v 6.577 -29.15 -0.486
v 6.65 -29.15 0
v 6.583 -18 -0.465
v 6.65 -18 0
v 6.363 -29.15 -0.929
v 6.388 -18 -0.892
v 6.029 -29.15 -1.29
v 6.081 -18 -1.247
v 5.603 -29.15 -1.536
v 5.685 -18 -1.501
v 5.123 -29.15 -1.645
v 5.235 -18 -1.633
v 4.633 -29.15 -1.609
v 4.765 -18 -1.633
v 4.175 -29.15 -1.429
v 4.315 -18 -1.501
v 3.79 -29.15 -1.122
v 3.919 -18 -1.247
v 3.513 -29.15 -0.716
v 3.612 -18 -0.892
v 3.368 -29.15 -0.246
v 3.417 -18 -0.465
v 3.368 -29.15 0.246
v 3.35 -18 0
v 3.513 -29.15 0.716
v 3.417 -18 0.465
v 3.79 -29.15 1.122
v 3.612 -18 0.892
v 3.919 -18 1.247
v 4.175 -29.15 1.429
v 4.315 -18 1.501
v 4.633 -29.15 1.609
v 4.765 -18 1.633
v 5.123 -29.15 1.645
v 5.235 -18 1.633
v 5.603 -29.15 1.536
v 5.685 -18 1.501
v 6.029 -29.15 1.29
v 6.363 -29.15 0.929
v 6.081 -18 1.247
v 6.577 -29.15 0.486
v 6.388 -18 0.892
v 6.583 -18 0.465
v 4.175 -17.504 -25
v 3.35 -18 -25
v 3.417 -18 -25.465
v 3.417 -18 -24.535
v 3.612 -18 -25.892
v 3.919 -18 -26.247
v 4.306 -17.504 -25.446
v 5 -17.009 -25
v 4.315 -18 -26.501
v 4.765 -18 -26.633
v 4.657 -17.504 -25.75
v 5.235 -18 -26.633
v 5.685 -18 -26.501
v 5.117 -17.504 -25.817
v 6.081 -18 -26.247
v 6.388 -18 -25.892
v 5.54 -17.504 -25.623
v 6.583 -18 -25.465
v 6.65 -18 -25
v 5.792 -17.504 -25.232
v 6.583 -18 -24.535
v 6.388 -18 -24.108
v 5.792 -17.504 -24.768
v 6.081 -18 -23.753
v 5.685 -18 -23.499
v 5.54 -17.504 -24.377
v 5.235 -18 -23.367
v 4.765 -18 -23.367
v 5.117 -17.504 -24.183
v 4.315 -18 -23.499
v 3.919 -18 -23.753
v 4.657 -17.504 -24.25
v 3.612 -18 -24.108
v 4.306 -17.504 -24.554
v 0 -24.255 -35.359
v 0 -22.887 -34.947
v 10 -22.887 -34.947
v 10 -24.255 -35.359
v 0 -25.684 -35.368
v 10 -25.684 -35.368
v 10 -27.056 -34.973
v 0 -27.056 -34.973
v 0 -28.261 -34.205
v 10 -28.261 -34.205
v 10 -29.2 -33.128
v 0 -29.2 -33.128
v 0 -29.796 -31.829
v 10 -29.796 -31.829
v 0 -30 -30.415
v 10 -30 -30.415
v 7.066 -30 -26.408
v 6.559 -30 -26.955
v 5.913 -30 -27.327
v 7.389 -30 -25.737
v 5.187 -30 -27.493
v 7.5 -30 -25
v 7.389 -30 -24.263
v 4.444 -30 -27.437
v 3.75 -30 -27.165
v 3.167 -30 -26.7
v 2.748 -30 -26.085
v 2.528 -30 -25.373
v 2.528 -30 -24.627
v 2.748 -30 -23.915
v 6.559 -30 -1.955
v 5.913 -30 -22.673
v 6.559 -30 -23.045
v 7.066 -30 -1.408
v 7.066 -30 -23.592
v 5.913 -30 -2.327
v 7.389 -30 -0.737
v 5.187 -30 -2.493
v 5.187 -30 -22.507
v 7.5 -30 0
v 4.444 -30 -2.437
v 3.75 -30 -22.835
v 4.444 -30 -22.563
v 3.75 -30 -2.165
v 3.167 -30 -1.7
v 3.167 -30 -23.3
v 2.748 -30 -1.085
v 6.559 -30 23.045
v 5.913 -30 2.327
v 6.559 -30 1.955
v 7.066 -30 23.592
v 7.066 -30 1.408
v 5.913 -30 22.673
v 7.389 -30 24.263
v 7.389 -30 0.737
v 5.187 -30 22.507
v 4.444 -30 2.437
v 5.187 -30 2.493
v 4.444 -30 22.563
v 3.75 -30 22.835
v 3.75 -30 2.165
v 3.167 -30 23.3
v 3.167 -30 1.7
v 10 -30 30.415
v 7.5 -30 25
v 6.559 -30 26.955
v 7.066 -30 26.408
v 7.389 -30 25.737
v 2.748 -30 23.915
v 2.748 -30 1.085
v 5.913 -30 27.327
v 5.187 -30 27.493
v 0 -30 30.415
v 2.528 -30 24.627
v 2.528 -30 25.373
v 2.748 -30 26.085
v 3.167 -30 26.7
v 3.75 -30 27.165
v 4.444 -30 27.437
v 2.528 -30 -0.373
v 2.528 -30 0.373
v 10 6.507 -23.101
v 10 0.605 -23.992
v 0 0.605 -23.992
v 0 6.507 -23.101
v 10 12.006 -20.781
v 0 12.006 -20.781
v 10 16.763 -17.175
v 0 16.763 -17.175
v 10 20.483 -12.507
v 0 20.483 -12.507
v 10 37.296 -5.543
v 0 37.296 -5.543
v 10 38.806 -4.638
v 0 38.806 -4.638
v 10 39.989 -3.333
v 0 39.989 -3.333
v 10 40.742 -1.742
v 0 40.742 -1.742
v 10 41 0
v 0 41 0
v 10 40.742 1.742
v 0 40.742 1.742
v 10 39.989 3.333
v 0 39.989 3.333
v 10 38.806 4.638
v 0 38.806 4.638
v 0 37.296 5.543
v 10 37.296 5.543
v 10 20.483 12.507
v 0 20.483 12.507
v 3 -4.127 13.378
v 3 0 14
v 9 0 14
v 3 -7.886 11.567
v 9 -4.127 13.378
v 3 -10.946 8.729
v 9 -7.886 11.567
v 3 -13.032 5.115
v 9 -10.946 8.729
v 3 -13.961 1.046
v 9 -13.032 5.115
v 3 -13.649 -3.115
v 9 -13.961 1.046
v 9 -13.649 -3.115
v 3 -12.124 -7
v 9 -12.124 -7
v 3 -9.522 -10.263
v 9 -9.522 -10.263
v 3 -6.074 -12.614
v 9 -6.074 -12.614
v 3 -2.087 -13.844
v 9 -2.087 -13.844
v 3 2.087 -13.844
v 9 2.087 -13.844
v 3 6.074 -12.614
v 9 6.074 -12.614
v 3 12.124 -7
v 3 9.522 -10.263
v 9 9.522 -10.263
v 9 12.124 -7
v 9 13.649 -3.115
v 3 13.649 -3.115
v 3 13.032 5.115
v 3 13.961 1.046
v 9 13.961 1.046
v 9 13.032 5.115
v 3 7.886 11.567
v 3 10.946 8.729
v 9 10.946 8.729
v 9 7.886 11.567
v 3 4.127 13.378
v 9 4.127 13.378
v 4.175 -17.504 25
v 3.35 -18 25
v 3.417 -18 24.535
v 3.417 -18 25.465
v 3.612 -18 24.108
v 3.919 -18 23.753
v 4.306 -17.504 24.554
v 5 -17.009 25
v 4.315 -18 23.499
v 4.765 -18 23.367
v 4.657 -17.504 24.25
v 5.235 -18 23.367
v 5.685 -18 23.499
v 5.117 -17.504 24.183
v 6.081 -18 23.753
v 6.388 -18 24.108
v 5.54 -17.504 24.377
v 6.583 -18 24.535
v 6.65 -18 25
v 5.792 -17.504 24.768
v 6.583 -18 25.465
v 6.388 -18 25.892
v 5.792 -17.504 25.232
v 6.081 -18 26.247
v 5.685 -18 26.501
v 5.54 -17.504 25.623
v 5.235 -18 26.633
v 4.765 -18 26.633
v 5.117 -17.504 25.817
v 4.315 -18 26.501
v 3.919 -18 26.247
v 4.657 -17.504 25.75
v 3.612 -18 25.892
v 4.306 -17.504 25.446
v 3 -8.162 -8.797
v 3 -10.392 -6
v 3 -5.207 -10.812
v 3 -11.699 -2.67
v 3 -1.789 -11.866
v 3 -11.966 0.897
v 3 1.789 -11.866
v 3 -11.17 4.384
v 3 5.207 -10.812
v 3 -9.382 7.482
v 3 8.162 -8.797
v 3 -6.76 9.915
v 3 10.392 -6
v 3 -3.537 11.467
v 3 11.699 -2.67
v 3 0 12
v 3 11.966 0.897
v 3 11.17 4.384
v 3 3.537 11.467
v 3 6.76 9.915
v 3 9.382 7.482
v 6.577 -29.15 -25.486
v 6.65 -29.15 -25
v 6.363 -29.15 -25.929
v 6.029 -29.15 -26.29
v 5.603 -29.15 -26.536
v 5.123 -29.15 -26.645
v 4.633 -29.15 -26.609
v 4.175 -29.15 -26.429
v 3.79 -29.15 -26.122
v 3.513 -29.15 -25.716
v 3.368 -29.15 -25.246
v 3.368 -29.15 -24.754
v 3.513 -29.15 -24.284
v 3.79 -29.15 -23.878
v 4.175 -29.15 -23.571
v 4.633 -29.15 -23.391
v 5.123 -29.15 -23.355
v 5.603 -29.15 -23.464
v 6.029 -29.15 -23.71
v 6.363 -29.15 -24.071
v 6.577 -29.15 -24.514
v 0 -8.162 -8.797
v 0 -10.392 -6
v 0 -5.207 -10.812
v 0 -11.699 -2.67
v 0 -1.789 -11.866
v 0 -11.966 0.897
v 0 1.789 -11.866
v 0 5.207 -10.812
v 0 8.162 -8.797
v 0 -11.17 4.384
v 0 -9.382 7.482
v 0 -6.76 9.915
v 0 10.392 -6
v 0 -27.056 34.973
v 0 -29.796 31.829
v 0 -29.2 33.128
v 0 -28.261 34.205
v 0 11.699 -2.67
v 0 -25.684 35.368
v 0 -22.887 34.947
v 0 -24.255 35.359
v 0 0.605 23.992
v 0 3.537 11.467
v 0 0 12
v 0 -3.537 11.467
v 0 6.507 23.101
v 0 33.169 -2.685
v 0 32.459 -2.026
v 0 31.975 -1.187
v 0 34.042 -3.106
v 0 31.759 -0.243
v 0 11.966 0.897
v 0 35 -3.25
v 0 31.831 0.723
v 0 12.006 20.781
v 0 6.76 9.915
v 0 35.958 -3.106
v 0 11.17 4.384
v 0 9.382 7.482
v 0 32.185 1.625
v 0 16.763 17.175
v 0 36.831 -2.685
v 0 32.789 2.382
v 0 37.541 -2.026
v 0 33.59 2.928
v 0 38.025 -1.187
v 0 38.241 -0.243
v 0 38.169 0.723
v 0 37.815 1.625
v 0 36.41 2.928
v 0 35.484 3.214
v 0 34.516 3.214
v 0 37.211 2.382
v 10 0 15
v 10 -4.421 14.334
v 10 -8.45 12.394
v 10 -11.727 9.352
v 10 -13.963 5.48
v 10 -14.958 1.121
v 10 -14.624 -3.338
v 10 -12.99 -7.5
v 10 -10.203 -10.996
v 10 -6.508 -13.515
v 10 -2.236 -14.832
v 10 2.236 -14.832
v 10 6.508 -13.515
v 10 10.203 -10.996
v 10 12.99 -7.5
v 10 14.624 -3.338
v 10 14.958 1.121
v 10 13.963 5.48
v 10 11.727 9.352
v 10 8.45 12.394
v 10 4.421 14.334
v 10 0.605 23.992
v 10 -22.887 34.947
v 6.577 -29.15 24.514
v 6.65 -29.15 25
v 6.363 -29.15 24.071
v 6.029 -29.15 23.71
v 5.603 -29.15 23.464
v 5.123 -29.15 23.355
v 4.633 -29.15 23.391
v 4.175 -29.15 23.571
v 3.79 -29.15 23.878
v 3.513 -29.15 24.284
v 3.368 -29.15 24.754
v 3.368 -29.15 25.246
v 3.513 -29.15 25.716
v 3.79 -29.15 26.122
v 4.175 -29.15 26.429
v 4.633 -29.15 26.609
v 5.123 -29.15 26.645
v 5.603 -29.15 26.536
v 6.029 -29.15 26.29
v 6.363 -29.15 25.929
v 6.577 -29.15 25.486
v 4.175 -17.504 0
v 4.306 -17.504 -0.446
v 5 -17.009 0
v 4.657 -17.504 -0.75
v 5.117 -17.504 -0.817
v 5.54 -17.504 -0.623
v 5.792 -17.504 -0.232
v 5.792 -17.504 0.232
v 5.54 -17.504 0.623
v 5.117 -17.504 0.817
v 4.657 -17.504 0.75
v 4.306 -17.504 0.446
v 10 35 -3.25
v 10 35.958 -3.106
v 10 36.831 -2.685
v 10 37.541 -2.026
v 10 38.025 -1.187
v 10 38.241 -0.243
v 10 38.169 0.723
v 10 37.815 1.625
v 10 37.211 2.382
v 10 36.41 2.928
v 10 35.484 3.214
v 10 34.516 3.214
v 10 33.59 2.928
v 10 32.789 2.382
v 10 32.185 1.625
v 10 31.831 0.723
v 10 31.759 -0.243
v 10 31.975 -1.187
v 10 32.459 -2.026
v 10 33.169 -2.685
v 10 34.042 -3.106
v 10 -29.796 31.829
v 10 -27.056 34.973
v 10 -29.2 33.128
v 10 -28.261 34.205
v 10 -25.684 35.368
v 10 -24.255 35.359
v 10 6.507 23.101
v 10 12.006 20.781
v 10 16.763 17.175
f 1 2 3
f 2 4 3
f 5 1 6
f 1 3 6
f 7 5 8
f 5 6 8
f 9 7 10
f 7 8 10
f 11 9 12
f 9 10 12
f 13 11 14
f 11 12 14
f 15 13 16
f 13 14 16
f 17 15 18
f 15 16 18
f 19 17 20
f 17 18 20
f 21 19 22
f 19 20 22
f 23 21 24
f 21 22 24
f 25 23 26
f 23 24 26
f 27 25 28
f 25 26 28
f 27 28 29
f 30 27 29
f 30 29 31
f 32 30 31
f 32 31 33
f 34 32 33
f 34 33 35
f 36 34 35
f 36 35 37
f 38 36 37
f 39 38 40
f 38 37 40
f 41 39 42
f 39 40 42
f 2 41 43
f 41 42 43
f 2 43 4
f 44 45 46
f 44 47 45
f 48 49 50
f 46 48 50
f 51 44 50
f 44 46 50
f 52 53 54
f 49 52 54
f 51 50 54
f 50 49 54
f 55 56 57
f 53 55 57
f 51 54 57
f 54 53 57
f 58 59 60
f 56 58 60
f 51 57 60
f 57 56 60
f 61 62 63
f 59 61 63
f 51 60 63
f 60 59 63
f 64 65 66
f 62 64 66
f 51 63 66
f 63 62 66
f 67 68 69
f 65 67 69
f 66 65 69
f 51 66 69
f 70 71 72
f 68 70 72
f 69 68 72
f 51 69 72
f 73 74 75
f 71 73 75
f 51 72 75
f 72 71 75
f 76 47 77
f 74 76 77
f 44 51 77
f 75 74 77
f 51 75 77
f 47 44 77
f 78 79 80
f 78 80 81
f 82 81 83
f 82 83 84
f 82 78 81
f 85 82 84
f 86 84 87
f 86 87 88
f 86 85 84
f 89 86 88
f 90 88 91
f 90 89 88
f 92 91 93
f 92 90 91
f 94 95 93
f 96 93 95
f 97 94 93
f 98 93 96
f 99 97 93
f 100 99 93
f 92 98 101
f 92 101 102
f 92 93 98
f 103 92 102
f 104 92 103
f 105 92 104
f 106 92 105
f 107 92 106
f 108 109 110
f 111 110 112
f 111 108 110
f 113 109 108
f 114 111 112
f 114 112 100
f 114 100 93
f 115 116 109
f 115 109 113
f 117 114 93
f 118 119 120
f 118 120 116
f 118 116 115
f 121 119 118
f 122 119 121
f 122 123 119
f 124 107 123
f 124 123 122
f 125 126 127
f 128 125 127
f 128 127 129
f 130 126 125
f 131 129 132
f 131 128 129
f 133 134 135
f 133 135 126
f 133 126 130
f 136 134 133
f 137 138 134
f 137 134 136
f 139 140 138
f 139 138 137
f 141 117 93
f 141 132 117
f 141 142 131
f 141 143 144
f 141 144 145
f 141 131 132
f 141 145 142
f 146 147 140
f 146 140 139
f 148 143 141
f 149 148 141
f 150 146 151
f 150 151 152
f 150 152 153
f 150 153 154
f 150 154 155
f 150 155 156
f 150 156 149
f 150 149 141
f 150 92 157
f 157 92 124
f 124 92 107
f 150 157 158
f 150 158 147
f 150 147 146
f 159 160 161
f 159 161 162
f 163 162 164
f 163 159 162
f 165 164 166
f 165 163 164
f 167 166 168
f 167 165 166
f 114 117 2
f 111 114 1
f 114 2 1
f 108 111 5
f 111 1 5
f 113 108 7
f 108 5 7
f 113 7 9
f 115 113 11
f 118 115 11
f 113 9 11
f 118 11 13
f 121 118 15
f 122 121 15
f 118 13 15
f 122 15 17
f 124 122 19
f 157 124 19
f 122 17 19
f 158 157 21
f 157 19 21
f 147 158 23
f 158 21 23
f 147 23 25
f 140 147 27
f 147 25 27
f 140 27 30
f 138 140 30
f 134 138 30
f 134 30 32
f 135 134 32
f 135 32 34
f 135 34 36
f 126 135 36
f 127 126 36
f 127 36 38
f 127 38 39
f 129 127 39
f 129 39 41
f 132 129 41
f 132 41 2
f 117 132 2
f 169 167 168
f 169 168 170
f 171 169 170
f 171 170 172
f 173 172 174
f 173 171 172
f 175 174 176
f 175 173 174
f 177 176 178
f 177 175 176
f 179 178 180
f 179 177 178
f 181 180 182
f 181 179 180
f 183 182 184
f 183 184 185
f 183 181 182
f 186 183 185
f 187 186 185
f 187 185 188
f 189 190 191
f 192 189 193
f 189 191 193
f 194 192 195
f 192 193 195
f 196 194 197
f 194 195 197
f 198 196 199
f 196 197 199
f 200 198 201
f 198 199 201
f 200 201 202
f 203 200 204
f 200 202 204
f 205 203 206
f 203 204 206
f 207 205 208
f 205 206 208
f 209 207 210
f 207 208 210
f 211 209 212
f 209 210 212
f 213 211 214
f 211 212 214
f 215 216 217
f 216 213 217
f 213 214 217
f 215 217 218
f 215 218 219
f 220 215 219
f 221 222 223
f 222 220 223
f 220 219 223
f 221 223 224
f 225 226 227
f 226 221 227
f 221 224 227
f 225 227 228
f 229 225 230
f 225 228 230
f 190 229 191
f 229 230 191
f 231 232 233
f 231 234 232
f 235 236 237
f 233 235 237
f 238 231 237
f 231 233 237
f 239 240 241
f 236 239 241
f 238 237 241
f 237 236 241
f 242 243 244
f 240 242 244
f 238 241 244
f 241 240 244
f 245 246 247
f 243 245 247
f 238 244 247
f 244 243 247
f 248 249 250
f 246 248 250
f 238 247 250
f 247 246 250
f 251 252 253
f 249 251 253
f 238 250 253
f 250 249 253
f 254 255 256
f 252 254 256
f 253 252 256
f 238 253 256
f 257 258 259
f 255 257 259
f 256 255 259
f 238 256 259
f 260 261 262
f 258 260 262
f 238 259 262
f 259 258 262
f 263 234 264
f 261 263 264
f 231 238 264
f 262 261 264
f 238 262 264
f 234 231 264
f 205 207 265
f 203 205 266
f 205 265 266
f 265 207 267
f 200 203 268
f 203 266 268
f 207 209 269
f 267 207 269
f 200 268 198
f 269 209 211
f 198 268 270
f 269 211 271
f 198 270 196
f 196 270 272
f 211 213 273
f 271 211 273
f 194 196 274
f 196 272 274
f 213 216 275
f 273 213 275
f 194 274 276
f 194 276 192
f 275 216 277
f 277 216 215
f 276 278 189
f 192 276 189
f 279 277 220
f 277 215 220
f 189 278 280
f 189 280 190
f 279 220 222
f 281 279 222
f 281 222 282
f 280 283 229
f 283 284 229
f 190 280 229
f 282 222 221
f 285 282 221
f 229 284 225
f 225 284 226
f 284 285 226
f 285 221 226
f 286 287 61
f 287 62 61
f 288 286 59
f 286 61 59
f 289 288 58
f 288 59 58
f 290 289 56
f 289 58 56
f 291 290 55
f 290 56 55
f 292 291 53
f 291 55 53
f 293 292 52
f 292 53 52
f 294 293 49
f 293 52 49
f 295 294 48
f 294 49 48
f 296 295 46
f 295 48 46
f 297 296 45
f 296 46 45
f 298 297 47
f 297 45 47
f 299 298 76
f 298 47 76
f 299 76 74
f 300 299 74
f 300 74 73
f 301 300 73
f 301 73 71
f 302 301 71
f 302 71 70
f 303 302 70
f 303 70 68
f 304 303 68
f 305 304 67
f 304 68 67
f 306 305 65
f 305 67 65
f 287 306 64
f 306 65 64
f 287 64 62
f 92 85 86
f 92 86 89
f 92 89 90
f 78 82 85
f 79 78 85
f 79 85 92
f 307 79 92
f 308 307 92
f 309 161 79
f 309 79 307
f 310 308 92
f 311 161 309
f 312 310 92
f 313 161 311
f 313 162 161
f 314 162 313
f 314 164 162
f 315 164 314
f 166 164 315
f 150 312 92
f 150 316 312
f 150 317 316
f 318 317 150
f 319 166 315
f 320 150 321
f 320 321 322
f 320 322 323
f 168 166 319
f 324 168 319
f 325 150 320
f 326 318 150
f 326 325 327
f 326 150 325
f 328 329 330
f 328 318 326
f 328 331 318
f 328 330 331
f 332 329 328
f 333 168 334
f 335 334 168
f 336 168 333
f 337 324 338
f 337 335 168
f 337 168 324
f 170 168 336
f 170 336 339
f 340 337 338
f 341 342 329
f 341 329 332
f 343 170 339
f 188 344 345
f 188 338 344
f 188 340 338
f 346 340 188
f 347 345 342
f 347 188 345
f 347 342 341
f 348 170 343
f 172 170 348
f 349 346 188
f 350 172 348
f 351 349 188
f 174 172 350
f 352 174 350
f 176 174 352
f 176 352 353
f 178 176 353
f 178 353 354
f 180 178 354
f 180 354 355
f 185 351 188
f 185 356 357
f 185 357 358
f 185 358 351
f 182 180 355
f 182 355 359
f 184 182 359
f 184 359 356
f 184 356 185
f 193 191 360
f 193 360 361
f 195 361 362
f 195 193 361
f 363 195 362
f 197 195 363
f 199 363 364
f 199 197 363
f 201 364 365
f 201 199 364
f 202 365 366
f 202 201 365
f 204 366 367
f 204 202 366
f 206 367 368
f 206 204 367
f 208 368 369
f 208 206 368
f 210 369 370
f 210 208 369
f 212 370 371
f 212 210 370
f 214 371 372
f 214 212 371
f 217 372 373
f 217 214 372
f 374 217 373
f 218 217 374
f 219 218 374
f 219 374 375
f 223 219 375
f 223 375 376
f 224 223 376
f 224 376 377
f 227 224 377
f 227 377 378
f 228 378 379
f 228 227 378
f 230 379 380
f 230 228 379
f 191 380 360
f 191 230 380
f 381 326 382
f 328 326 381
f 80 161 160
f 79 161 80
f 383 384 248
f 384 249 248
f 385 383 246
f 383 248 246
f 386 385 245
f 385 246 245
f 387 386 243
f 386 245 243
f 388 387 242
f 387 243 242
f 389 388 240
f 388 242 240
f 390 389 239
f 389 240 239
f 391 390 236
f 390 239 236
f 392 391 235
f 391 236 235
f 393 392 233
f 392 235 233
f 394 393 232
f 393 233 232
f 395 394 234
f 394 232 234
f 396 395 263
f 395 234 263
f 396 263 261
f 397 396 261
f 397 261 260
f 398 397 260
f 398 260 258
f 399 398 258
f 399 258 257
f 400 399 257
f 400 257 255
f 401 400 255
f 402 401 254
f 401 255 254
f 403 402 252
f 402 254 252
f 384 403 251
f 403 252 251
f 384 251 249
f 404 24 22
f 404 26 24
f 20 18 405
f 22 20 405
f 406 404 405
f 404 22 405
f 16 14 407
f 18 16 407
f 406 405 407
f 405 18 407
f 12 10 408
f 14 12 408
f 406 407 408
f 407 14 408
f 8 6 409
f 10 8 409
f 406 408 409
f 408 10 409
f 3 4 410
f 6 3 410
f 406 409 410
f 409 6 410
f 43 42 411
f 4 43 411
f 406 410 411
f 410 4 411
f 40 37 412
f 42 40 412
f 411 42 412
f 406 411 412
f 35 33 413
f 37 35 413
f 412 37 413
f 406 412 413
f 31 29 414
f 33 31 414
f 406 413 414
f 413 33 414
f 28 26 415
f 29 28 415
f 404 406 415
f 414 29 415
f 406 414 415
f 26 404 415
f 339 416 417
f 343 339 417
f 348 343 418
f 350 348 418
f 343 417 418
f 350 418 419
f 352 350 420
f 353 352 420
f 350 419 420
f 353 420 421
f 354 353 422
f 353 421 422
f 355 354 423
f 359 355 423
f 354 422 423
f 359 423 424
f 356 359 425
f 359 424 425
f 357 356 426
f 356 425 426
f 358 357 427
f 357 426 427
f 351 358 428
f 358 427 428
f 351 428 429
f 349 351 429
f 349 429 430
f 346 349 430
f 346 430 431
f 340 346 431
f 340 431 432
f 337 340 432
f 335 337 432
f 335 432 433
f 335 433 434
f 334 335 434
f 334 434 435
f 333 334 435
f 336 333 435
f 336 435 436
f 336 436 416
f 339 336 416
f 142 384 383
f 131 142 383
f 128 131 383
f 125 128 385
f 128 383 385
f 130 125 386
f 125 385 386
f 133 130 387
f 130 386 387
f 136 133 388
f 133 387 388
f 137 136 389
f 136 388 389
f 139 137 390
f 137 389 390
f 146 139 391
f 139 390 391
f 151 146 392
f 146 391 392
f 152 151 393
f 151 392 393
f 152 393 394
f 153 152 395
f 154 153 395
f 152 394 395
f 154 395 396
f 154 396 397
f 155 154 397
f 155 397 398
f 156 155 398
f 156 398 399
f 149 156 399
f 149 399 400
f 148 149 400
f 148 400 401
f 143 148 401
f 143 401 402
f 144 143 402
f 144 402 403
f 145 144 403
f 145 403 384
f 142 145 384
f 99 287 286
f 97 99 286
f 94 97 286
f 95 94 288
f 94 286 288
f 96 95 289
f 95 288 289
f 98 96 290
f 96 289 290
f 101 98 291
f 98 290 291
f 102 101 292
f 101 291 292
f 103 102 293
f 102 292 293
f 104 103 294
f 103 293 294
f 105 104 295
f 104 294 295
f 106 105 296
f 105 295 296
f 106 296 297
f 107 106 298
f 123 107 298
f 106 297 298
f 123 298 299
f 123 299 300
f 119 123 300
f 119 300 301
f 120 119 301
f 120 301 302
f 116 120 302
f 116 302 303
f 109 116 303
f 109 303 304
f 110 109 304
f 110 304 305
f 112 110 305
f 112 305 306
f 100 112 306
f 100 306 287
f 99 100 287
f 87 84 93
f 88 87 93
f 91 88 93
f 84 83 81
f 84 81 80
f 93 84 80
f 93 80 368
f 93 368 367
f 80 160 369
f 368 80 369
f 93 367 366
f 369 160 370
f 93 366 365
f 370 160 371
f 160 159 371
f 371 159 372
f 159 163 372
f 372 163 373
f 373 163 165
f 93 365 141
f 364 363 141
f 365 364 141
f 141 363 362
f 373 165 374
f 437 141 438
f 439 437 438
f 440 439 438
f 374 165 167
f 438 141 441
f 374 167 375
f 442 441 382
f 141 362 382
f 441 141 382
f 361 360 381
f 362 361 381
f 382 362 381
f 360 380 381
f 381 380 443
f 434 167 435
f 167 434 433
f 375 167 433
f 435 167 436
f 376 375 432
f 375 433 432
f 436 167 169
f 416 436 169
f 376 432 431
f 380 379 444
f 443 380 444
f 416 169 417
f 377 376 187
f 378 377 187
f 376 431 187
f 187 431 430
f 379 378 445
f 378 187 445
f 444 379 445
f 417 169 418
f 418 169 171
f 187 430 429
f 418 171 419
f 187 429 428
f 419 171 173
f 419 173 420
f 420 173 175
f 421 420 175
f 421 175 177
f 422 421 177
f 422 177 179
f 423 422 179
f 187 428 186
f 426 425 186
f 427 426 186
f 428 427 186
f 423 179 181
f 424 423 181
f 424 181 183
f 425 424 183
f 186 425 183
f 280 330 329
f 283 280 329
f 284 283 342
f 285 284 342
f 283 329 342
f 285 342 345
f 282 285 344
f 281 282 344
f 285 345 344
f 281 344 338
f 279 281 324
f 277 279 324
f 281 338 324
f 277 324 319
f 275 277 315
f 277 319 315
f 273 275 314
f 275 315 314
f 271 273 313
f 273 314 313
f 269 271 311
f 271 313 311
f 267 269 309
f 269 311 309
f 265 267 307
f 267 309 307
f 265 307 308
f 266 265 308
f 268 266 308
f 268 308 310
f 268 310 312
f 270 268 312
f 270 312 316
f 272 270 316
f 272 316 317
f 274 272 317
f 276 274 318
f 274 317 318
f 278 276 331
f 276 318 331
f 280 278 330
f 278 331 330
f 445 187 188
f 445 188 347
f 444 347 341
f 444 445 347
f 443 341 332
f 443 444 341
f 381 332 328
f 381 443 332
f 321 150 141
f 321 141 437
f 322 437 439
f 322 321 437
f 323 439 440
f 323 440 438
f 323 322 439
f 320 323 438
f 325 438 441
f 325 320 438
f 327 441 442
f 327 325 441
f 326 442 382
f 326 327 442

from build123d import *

# Parameters (mm, degrees)
SKETCH_1_W                  = 10
SKETCH_1_H                  = 10
SKETCH_6_R                  = 14
SKETCH_6_R_2                = 12
EXTRUDE_1_DEPTH             = 3
SKETCH_7_R                  = 19.5
EXTRUDE_2_DEPTH             = 10
HOLE_WIZARD_M43_D           = 3.3
HOLE_WIZARD_M43_DEPTH       = 12
HOLE_WIZARD_M43_CSINK_D     = 5
HOLE_WIZARD_M43_CSINK_ANGLE = 90
HOLE_WIZARD_M43_TIP         = 0.991420021
EXTRUDE_START               = -10
EXTRUDE_3_DEPTH             = 10
HOLE_WIZARD_M61_D           = 6.5
CHAMFER_1_SIZE              = 1


with BuildPart() as part:
    # Эскиз1 → Повернуть1 (revolve)
    with BuildSketch(Plane.XY, mode=Mode.PRIVATE) as revolve_1_sk:
        with Locations((5, 19)):
            Rectangle(SKETCH_1_W, SKETCH_1_H)
    revolve(revolve_1_sk.sketch.rotate(Axis((-29.36512031, 0, 0), (1, 0, 0)), 90), axis=Axis((-29.36512031, 0, 0), (1, 0, 0)))

    # Эскиз6 → Бобышка-Вытянуть1 (add)
    with BuildSketch(Plane.ZY):
        Circle(SKETCH_6_R)
        Circle(SKETCH_6_R_2, mode=Mode.SUBTRACT)
    extrude(amount=-EXTRUDE_1_DEPTH)

    # Эскиз7 → Бобышка-Вытянуть2 (add)
    with BuildSketch(Plane.ZY):
        with BuildLine():
            Line((-30.415116076, -30), (30.415116076, -30))
            ThreePointArc((30.415116076, -30), (34.632073305, -27.686498042), (34.946655011, -22.886908691))
            Line((34.946655011, -22.886908691), (19.938771315, 9.297601758))
            ThreePointArc((19.938771315, 9.297601758), (0, 22), (-19.938771315, 9.297601758))
            Line((-19.938771315, 9.297601758), (-34.946655011, -22.886908691))
            ThreePointArc((-34.946655011, -22.886908691), (-34.632073305, -27.686498042), (-30.415116076, -30))
        make_face()
        Circle(SKETCH_7_R, mode=Mode.SUBTRACT)
    extrude(amount=-EXTRUDE_2_DEPTH)

    # Отверстие обработанное метчиком M43
    with Locations(Plane(origin=(0, -30, 0), x_dir=(-1, 0, 0), z_dir=(0, -1, 0))):
        with Locations((-5, 0), (-5, 25), (-5, -25)):
            CounterSinkHole(HOLE_WIZARD_M43_D / 2, HOLE_WIZARD_M43_CSINK_D / 2, depth=HOLE_WIZARD_M43_DEPTH, counter_sink_angle=HOLE_WIZARD_M43_CSINK_ANGLE)
            with Locations((0, 0, -(HOLE_WIZARD_M43_DEPTH + HOLE_WIZARD_M43_TIP / 2))):  # 118° drill point
                Cone(0, HOLE_WIZARD_M43_D / 2, HOLE_WIZARD_M43_TIP, mode=Mode.SUBTRACT)

    # Эскиз10 → Бобышка-Вытянуть3 (add)
    with BuildSketch(Plane.ZY.offset(EXTRUDE_START)):
        with BuildLine():
            Line((-12.507364702, 20.483306086), (-5.543277195, 37.296100594))
            ThreePointArc((-5.543277195, 37.296100594), (0, 41), (5.543277195, 37.296100594))
            Line((5.543277195, 37.296100594), (12.507364702, 20.483306086))
            ThreePointArc((12.507364702, 20.483306086), (0, 24), (-12.507364702, 20.483306086))
        make_face()
    extrude(amount=EXTRUDE_3_DEPTH)

    # Сверло под метчик  спиральное M61 (through all)
    with Locations(Plane.ZY):
        with Locations((0, 35)):
            Hole(HOLE_WIZARD_M61_D / 2)

    # Фаска1
    chamfer_1_edges = [part.edges().sort_by_distance(p)[0] for p in [
        (10, 0, -14),
    ]]
    chamfer(chamfer_1_edges, length=CHAMFER_1_SIZE)


solid = part.part
